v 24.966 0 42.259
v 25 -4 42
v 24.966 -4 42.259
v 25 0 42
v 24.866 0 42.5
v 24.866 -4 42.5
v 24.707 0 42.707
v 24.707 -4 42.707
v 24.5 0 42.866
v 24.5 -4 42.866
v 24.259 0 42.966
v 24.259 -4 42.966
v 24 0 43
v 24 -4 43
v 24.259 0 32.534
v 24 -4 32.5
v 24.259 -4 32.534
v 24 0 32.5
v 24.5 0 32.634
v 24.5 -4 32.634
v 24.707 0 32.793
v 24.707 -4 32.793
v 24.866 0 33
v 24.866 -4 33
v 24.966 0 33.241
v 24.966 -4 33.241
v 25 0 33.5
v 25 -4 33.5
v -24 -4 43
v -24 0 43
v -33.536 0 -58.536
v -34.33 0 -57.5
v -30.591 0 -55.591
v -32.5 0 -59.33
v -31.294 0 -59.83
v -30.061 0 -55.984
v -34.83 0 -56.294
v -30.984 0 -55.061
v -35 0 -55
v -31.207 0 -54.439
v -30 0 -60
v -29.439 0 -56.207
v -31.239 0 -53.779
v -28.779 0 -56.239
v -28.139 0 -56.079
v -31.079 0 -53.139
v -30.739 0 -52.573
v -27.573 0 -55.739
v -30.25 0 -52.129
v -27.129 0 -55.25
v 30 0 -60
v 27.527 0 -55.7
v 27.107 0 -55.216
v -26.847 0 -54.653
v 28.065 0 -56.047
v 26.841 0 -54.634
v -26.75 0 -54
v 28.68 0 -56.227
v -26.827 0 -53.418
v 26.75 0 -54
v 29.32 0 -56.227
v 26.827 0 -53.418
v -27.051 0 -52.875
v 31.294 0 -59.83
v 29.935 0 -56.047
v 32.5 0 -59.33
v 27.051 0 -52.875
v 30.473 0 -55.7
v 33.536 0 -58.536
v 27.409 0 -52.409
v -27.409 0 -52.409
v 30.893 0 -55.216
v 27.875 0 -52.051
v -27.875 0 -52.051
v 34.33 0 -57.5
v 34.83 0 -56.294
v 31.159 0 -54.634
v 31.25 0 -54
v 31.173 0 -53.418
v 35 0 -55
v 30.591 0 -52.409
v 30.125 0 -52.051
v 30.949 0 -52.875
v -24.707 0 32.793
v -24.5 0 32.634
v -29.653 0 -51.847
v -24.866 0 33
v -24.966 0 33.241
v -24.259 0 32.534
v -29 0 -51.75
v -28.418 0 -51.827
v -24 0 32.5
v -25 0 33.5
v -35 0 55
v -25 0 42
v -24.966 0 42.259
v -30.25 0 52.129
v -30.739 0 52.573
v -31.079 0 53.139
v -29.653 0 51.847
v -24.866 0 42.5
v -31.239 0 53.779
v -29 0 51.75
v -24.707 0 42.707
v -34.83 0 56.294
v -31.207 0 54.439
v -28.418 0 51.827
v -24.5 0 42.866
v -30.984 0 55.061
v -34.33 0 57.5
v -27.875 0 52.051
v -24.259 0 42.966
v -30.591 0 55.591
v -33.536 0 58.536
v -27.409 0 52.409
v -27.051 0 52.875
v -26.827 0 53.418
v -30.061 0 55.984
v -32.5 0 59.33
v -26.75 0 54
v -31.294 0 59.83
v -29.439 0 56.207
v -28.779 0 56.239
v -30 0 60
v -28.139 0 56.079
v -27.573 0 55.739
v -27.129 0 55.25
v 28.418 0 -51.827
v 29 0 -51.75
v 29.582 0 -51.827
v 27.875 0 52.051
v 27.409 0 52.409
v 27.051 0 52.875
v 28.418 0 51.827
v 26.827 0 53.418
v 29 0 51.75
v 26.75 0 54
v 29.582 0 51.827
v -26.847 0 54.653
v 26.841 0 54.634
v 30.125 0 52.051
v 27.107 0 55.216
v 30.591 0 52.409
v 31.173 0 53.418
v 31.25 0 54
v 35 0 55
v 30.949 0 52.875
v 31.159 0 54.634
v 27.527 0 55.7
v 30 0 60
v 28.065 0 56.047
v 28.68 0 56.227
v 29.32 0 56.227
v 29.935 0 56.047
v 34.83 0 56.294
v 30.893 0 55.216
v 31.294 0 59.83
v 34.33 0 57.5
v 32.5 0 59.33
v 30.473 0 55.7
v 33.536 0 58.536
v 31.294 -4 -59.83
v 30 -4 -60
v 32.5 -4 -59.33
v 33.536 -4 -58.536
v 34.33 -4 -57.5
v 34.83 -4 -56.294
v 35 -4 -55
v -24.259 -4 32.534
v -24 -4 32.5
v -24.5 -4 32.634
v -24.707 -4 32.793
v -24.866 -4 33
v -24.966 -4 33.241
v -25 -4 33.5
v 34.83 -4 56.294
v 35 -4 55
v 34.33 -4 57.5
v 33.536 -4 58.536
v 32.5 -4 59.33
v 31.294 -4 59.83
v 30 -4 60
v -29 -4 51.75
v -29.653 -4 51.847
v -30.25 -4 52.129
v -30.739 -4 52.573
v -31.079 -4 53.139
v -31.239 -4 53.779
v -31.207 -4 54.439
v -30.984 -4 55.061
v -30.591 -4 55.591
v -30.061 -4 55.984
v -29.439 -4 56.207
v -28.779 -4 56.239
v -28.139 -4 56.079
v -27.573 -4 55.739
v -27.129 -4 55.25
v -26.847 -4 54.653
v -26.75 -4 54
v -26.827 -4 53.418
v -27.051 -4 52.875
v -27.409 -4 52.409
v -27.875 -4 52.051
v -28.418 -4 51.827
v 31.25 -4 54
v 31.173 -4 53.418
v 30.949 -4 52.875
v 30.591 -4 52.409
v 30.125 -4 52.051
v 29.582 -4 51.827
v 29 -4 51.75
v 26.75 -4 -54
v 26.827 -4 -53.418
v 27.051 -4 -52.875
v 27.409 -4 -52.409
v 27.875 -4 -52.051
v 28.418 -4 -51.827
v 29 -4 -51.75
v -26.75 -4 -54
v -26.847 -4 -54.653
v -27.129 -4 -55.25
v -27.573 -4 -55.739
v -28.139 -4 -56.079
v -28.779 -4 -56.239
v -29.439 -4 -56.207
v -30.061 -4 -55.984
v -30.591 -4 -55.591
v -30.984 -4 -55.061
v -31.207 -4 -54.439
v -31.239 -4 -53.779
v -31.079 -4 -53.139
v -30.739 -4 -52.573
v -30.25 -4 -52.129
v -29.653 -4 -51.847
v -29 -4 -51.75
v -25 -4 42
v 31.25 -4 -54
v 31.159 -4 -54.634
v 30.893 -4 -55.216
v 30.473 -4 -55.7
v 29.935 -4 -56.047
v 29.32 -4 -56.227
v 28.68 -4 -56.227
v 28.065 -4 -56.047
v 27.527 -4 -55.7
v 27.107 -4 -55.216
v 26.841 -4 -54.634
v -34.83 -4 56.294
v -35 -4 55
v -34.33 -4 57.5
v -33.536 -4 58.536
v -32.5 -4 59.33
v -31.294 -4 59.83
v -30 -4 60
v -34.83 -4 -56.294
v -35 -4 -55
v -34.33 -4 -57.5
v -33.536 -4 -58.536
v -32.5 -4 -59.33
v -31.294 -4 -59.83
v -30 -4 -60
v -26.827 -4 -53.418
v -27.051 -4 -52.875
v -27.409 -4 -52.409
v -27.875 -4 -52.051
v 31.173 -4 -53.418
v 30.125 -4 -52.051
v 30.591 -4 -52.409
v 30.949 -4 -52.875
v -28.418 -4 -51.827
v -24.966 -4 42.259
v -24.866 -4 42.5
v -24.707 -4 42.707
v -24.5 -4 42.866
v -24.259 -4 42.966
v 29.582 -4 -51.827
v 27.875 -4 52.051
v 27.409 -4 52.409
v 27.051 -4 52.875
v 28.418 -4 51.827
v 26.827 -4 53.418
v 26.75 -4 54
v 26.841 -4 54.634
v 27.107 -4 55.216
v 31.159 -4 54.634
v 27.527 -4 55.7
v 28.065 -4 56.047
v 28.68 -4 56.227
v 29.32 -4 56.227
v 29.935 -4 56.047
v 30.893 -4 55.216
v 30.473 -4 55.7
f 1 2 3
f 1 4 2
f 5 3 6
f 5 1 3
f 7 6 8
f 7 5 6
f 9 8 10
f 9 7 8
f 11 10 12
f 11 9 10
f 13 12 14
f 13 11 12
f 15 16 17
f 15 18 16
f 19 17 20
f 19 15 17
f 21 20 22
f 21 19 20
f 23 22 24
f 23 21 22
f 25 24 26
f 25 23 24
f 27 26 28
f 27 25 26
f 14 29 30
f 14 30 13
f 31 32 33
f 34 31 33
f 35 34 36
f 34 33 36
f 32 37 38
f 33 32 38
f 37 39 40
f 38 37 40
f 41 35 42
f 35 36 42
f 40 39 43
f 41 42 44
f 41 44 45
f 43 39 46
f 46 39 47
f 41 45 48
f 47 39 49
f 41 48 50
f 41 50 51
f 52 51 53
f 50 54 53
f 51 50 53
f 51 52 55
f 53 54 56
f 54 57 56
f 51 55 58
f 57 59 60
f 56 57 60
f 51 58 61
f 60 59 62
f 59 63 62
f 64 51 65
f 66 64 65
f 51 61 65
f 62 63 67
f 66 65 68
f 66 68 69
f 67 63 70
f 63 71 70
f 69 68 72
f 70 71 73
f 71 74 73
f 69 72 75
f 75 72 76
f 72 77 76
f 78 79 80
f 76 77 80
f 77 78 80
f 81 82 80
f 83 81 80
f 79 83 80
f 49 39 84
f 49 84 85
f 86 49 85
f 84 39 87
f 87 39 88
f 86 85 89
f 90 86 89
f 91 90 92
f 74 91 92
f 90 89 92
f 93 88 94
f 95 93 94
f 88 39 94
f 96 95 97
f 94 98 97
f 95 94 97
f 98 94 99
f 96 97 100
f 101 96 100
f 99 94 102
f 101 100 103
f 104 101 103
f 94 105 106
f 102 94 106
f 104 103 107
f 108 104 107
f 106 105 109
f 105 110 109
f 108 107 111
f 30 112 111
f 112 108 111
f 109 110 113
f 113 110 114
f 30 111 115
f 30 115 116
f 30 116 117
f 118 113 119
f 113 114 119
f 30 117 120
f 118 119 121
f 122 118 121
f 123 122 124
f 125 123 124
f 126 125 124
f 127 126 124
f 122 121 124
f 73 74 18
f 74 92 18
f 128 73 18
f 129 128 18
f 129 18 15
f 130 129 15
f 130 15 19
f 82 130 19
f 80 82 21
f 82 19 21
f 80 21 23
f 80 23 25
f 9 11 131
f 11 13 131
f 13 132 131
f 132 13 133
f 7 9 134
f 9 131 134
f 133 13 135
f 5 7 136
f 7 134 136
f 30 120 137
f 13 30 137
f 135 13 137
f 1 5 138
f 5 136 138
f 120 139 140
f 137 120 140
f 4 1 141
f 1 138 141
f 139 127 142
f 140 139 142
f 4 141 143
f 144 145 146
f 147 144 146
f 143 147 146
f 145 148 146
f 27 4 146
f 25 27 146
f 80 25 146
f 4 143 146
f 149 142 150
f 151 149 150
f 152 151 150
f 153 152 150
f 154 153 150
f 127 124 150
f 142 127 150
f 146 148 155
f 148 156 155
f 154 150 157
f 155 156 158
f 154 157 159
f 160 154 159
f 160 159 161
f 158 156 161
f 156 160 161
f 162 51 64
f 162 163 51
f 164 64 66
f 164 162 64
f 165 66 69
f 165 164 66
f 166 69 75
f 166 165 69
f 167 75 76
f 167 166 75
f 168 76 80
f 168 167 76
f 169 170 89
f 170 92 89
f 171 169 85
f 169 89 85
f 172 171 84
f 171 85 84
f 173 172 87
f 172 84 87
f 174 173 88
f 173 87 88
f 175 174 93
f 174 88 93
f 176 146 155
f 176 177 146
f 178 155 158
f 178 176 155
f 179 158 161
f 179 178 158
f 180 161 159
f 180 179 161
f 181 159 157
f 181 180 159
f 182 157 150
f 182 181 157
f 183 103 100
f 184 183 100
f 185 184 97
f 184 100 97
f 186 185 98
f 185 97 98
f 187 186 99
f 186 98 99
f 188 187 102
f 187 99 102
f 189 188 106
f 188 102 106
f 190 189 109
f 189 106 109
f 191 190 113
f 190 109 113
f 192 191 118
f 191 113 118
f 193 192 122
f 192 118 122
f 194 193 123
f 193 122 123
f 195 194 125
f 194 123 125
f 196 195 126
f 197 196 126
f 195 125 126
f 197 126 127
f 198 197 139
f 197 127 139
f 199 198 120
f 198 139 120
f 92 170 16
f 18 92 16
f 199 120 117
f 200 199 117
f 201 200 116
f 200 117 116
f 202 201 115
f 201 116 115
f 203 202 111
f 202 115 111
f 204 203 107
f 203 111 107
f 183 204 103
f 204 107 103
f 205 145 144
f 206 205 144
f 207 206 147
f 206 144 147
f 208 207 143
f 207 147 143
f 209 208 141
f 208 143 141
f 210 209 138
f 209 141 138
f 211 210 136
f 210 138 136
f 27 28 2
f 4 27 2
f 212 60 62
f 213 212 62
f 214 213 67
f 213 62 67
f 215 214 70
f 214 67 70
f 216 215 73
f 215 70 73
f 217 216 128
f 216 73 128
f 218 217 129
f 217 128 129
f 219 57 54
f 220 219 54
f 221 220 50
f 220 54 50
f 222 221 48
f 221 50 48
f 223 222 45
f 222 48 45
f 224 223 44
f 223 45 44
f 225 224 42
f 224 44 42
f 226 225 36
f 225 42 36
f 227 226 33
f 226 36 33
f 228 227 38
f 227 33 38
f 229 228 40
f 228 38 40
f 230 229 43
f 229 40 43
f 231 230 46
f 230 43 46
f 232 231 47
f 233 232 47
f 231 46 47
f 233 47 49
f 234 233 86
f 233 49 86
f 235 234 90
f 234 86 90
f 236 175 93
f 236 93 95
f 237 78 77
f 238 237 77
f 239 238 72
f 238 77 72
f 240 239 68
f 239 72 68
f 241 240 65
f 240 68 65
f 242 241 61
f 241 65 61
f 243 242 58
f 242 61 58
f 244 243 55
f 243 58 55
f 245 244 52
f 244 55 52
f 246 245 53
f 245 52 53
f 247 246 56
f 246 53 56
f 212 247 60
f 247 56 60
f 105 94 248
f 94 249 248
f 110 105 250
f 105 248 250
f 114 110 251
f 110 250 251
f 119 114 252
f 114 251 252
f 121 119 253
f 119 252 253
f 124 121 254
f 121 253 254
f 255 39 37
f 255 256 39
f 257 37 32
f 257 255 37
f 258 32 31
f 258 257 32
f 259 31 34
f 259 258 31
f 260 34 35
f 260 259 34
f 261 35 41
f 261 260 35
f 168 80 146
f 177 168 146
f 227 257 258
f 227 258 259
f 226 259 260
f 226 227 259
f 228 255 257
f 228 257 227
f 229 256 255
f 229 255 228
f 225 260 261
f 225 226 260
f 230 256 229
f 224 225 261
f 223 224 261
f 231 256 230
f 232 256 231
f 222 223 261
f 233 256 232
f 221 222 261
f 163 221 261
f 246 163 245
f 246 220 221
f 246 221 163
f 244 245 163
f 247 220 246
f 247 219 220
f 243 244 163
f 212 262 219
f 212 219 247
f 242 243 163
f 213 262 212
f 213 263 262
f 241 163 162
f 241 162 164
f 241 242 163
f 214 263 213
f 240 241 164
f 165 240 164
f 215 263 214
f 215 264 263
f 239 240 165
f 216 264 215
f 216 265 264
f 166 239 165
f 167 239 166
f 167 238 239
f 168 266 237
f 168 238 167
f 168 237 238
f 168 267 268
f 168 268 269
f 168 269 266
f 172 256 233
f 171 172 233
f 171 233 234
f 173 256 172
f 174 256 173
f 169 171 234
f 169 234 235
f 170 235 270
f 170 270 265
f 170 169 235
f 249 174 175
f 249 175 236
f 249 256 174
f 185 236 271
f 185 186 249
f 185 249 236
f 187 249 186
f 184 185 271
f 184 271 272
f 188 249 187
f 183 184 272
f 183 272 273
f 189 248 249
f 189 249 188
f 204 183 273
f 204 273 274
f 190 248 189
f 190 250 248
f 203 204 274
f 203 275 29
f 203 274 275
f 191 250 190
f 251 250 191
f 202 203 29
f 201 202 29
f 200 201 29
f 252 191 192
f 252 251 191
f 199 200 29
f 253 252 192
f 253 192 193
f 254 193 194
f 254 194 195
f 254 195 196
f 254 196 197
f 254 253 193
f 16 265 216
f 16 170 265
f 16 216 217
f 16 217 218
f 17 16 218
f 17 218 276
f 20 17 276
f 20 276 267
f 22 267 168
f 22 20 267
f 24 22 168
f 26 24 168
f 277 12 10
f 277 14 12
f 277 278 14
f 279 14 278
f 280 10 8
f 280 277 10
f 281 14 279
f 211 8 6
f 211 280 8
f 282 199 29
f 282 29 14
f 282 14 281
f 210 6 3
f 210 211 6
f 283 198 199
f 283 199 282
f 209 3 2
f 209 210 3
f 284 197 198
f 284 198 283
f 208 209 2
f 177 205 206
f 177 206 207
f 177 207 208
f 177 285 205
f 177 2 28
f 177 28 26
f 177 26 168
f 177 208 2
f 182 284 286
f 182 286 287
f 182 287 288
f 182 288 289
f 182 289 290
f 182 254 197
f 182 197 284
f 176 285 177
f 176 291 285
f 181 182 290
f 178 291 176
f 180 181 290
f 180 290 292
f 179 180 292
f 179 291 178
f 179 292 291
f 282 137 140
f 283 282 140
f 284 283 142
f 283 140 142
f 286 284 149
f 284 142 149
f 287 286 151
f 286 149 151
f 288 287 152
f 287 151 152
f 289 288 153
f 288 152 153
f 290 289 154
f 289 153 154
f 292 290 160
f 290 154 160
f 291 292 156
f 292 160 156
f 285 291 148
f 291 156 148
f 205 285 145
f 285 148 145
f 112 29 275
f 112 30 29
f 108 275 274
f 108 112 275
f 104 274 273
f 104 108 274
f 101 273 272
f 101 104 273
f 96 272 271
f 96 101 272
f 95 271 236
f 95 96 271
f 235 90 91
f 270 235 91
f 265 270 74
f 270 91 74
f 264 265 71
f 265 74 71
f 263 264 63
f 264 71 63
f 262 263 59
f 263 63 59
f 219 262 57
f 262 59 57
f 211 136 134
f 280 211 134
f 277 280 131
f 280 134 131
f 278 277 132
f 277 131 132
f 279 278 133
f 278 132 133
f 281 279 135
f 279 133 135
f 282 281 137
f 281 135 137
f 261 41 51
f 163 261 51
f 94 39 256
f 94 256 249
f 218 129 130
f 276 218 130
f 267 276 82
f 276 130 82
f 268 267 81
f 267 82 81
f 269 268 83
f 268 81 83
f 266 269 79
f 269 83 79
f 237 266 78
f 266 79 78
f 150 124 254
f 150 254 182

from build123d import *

# Parameters (mm, degrees)
F0_W     = 70
F0_H     = 120
F1_DEPTH = 4
F2_R     = 5
F3_W     = 50
F3_H     = 10.5
F4_DEPTH = 25
F5_R     = 1


with BuildPart() as f1:
    # F0 (on Front) → F1 (new body)
    with BuildSketch(Plane.XZ):
        Rectangle(F0_W, F0_H)
        with BuildLine():
            ThreePointArc((-29, 51.75), (-30.5909902577, 55.5909902577), (-26.75, 54))
            Line((-26.75, 54), (26.75, 54))
            ThreePointArc((26.75, 54), (29, 56.25), (31.25, 54))
            ThreePointArc((31.25, 54), (30.5909902577, 52.4090097423), (29, 51.75))
            Line((29, 51.75), (29, -51.75))
            ThreePointArc((29, -51.75), (30.5909902577, -52.4090097423), (31.25, -54))
            ThreePointArc((31.25, -54), (29, -56.25), (26.75, -54))
            Line((26.75, -54), (-26.75, -54))
            ThreePointArc((-26.75, -54), (-30.5909902577, -55.5909902577), (-29, -51.75))
            Line((-29, -51.75), (-29, 51.75))
        make_face(mode=Mode.SUBTRACT)
        with BuildLine():
            Line((26.75, 54), (-26.75, 54))
            ThreePointArc((-26.75, 54), (-27.4090097423, 52.4090097423), (-29, 51.75))
            Line((-29, 51.75), (-29, -51.75))
            ThreePointArc((-29, -51.75), (-27.4090097423, -52.4090097423), (-26.75, -54))
            Line((-26.75, -54), (26.75, -54))
            ThreePointArc((26.75, -54), (27.4090097423, -52.4090097423), (29, -51.75))
            Line((29, -51.75), (29, 51.75))
            ThreePointArc((29, 51.75), (27.4090097423, 52.4090097423), (26.75, 54))
        make_face()
    extrude(amount=F1_DEPTH)

    # F2
    f2_edges = [f1.edges().sort_by_distance(p)[0] for p in [
        (-35, -2, 60),
        (35, -2, 60),
        (-35, -2, -60),
        (35, -2, -60),
    ]]
    fillet(f2_edges, radius=F2_R)

    # F3 (on face) → F4 (cut)
    with BuildSketch(Plane.XZ.offset(4)):
        with Locations((0, 37.75)):
            Rectangle(F3_W, F3_H)
    extrude(amount=-F4_DEPTH, mode=Mode.SUBTRACT)

    # F5
    f5_edges = [f1.edges().sort_by_distance(p)[0] for p in [
        (-25, -2, 32.5),
        (-25, -2, 43),
        (25, -2, 43),
        (25, -2, 32.5),
    ]]
    fillet(f5_edges, radius=F5_R)


solid = f1.part
